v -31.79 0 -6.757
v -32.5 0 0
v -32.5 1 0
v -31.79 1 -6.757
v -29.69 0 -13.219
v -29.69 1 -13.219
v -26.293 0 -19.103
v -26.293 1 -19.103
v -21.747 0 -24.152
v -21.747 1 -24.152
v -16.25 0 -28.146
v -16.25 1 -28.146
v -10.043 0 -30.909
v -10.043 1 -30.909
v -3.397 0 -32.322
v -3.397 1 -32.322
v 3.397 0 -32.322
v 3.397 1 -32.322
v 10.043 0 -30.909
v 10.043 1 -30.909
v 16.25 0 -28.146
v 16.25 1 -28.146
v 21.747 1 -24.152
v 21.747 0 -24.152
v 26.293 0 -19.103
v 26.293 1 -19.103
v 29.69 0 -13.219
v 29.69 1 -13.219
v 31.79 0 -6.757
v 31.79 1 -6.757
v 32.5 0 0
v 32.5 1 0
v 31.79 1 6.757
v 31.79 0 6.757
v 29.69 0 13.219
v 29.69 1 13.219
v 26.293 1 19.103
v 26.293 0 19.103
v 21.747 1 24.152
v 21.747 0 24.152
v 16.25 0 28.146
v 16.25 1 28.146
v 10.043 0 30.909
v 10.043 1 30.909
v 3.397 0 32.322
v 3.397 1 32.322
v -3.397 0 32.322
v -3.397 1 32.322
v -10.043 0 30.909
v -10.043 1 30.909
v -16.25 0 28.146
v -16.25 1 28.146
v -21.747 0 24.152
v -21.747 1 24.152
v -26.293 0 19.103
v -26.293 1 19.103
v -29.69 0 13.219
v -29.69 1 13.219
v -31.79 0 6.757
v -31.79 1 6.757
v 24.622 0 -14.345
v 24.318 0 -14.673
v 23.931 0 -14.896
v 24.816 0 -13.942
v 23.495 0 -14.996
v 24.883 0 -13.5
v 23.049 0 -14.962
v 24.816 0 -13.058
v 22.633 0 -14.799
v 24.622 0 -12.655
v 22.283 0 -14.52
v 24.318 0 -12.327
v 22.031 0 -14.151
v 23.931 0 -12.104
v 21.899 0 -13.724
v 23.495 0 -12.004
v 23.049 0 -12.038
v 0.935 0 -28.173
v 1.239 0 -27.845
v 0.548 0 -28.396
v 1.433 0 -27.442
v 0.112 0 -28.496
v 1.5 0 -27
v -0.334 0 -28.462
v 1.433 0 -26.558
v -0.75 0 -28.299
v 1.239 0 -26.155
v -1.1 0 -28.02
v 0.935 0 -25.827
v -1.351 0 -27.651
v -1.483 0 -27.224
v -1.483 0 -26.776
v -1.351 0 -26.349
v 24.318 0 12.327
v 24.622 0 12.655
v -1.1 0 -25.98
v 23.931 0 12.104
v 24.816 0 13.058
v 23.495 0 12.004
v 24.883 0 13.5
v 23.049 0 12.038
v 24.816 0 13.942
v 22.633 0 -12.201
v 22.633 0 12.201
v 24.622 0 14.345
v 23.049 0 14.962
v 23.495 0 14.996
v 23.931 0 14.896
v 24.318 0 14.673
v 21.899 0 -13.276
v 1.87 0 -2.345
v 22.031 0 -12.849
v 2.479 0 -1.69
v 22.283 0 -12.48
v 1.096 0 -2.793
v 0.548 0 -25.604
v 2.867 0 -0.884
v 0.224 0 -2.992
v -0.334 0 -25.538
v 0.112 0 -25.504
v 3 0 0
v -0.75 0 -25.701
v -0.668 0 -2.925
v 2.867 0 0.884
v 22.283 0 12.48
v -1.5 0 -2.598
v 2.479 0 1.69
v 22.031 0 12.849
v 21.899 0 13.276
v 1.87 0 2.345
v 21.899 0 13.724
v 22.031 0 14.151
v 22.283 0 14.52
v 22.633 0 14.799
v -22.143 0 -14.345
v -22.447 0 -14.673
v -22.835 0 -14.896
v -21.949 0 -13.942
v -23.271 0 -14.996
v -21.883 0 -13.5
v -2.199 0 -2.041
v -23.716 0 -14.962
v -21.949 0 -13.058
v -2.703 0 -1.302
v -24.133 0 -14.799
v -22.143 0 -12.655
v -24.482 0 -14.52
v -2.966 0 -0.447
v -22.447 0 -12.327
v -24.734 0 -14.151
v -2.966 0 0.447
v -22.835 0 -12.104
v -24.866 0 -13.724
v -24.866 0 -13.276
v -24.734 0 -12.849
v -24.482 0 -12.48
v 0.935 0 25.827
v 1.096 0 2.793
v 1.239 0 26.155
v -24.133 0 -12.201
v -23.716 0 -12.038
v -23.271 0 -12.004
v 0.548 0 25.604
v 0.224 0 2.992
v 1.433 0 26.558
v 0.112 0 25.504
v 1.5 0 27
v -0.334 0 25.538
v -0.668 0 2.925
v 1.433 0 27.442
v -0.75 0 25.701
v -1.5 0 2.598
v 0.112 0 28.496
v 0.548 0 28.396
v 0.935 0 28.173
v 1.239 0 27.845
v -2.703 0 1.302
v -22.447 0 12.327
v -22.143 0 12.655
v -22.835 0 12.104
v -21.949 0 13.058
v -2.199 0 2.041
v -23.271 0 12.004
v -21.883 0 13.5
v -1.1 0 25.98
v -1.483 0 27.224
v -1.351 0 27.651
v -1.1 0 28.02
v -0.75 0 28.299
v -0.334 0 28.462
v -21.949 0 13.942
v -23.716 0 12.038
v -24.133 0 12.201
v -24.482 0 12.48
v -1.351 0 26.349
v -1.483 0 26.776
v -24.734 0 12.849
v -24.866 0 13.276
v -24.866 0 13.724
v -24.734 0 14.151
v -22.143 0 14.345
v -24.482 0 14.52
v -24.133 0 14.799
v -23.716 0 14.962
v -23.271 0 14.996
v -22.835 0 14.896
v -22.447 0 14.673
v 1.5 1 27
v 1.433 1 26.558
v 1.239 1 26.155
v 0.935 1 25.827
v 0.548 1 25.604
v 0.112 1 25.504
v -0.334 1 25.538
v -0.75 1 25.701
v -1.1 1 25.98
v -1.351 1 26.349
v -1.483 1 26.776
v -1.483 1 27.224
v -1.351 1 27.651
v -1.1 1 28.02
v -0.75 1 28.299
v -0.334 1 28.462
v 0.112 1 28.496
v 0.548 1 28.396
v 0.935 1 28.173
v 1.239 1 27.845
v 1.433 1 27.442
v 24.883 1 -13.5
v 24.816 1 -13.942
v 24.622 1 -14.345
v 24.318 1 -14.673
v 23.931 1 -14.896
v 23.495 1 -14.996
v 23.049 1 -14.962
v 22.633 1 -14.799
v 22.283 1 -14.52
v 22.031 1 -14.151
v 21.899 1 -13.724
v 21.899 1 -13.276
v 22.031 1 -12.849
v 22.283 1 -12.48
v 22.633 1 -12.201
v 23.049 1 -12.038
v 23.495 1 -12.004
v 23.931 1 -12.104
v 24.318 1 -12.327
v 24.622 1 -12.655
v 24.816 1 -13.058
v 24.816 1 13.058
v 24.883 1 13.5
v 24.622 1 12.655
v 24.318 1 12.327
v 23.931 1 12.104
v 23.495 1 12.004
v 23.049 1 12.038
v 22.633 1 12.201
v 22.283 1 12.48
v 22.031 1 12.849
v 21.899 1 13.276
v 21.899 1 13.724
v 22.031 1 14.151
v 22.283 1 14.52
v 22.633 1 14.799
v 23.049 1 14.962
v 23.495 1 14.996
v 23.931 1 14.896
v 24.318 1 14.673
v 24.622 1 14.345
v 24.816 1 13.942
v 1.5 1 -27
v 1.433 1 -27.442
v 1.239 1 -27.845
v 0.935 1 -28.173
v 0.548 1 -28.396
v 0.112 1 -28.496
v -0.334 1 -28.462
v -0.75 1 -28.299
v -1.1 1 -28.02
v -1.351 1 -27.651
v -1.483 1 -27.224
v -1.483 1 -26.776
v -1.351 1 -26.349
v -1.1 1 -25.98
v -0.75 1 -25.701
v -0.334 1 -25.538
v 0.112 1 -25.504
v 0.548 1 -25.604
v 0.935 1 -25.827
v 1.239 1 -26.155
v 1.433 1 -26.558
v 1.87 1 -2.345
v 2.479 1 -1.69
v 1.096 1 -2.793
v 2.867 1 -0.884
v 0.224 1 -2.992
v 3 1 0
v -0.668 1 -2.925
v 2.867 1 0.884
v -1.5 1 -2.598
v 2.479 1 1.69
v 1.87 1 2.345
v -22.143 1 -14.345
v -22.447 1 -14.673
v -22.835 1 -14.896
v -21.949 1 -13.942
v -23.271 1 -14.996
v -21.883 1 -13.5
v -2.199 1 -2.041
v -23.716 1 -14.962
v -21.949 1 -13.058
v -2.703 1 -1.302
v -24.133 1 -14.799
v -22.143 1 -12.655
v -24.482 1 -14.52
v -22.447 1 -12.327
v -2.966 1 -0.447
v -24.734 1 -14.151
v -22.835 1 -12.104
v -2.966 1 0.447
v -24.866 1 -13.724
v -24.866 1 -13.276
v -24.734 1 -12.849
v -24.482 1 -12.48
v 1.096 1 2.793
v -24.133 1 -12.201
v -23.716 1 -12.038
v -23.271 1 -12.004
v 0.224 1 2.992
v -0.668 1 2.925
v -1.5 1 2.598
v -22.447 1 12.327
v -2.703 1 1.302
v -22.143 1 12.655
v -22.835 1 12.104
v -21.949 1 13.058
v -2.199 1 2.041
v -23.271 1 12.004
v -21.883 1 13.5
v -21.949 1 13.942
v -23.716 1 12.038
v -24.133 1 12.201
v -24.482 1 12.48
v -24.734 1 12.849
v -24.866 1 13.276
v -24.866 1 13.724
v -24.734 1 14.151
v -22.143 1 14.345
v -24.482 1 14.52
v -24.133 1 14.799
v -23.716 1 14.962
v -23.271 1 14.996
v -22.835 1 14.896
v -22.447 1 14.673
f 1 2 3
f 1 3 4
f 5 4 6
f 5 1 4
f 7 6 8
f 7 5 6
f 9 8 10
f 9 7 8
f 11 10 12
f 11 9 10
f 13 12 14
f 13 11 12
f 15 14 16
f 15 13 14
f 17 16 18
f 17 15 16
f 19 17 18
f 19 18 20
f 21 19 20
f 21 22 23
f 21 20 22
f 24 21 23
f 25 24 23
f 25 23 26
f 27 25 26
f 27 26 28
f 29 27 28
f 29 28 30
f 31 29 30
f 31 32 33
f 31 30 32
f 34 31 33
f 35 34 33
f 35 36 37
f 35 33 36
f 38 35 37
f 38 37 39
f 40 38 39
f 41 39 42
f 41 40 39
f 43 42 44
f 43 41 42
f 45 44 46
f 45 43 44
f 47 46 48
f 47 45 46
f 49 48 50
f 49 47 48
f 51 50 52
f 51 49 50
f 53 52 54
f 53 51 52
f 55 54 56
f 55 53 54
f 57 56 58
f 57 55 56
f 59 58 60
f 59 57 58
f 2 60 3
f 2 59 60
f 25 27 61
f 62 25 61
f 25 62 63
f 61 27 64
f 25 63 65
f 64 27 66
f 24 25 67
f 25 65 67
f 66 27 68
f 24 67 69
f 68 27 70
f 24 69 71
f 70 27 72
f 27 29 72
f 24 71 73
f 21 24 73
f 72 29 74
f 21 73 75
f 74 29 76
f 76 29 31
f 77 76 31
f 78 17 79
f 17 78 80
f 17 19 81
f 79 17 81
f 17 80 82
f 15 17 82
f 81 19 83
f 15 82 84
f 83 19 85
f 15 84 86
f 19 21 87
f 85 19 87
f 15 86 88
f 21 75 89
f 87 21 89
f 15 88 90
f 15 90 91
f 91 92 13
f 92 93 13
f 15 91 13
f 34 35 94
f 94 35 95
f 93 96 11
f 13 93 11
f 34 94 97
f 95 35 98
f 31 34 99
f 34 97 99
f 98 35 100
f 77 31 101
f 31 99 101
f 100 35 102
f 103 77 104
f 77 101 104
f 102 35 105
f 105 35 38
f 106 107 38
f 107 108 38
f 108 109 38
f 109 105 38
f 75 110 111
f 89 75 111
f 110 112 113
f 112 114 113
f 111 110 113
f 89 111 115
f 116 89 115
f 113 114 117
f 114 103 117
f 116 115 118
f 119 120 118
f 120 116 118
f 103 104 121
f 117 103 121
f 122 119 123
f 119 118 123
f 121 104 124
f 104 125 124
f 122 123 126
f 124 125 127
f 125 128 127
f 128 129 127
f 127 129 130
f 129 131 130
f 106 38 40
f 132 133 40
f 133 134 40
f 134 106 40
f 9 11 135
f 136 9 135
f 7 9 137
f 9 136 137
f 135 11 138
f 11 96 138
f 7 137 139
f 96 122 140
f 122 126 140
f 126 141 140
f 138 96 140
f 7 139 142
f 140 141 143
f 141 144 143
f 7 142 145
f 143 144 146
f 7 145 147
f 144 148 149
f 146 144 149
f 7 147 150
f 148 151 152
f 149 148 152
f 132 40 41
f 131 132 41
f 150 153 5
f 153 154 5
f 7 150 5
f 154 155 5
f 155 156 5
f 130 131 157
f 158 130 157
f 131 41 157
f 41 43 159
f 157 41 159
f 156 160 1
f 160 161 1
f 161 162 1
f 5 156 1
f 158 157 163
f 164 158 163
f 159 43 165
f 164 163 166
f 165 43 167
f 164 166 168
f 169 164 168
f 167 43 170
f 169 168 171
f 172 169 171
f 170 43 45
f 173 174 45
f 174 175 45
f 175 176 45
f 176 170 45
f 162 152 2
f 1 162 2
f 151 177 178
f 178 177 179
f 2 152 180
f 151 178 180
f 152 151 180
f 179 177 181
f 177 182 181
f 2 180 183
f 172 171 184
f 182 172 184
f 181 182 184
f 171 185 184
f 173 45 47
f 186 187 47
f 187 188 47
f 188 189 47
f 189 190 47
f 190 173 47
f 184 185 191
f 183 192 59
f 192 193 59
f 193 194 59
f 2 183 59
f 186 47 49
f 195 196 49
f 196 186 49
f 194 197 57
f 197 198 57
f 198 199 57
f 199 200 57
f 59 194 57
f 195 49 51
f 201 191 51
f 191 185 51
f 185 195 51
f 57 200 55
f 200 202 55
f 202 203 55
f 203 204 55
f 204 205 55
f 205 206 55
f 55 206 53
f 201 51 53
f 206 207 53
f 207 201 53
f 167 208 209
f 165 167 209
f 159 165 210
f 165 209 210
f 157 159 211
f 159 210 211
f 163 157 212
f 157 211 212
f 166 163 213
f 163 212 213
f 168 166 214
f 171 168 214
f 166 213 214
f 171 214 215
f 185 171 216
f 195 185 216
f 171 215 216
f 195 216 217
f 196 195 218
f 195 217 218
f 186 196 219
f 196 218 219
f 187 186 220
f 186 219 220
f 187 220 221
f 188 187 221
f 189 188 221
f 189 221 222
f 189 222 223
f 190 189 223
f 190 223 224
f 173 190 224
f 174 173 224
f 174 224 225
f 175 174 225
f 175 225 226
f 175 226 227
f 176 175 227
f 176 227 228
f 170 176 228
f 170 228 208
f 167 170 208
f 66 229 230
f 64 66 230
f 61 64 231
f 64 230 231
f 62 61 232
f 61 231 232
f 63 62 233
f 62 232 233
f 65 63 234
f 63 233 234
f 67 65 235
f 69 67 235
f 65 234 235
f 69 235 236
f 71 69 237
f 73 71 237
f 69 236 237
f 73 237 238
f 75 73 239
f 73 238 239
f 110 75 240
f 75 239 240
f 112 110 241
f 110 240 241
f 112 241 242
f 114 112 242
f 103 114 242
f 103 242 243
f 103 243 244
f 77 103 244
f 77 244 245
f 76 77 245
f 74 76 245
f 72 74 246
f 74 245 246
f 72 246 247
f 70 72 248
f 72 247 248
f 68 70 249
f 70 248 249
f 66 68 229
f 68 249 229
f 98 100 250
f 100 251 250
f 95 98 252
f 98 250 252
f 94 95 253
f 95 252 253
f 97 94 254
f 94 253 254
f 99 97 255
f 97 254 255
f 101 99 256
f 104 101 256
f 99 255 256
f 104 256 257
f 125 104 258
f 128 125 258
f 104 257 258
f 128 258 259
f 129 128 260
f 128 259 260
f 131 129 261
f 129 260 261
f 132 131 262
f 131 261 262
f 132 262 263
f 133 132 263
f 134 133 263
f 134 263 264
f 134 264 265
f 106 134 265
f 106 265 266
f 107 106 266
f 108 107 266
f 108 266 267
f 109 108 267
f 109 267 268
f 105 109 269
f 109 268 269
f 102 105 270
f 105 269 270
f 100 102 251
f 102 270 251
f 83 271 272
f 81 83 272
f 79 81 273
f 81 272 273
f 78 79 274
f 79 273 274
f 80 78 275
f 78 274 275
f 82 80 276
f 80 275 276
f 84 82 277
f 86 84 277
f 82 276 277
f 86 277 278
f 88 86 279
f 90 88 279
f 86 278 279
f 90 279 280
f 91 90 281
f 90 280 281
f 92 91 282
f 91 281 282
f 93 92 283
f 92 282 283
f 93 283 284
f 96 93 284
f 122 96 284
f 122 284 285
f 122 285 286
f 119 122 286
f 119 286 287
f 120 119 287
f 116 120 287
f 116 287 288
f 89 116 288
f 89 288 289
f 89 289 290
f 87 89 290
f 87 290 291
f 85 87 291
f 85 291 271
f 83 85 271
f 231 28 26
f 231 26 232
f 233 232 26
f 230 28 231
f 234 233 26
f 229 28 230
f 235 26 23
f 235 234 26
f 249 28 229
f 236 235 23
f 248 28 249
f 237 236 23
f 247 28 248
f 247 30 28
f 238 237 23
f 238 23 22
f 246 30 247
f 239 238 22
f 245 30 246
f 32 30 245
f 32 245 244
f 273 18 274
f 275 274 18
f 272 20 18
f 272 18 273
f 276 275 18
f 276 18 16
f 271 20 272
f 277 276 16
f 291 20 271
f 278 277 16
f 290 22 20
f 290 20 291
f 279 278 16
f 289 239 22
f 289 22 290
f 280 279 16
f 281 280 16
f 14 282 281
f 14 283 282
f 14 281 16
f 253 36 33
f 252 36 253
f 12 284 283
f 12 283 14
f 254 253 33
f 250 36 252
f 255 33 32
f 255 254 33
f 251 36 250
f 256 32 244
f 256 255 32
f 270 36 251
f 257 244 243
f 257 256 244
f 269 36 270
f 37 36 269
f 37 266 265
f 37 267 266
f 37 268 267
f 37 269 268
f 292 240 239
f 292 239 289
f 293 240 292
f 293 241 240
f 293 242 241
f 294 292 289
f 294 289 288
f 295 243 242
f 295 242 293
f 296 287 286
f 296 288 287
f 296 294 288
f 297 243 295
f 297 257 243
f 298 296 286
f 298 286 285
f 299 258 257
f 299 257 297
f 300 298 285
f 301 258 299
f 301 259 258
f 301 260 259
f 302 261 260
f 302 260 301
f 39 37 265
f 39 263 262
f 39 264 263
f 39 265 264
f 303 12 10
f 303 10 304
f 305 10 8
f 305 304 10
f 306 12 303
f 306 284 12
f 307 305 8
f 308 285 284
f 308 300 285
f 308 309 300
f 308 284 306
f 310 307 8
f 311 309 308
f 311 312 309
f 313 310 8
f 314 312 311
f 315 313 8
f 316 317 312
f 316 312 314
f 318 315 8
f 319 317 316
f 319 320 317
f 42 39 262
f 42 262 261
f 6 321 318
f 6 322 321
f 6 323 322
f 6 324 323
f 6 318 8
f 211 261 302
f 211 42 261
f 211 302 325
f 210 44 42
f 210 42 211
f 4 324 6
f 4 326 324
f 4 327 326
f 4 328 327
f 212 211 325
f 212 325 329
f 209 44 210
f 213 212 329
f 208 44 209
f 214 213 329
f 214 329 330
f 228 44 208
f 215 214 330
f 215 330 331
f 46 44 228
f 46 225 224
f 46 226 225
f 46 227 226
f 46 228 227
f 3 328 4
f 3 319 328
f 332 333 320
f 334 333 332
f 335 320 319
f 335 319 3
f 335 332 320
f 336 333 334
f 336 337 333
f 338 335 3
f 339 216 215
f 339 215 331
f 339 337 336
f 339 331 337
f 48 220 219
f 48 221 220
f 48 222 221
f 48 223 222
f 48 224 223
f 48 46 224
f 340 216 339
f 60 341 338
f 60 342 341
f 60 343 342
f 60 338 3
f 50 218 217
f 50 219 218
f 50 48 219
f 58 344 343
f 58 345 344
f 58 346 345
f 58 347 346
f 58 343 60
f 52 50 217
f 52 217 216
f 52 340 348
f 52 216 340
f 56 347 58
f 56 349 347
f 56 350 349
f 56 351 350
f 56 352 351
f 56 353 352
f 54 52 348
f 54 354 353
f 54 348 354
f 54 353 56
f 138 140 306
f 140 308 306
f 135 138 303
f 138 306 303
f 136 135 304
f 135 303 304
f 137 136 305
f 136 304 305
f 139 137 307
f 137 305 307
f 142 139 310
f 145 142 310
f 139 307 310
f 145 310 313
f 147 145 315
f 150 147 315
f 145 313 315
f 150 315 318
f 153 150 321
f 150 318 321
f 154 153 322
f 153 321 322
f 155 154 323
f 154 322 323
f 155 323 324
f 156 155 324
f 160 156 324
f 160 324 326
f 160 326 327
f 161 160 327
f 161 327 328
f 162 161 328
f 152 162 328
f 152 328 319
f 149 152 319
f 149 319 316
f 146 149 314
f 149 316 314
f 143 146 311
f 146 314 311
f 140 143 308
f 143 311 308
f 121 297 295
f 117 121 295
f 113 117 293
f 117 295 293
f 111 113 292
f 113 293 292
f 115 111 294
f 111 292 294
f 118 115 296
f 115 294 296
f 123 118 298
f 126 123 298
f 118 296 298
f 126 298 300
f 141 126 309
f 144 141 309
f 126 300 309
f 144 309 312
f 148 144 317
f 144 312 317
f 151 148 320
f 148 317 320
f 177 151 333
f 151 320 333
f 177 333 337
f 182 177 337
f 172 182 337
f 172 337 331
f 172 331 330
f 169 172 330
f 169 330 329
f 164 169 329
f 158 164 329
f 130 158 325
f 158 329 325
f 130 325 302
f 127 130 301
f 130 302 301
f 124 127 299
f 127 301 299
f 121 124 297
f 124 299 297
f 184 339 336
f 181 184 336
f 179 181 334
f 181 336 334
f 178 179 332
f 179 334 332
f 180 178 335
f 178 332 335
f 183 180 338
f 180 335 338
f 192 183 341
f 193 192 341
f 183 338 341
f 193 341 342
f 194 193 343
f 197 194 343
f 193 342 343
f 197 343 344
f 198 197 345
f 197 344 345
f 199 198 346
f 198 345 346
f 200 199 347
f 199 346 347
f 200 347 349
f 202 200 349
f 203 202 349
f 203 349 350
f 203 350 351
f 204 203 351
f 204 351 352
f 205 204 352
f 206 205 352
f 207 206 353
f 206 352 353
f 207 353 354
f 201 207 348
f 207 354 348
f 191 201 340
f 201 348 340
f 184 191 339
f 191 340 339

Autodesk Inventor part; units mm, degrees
ref_plane "YZ Plane" through (0, 0, 0) normal (1, 0, 0) x (0, 1, 0)
ref_plane "XZ Plane" through (0, 0, 0) normal (0, 1, 0) x (-1, 0, 0)
ref_plane "XY Plane" through (0, 0, 0) normal (0, 0, 1) x (1, 0, 0)
sketch "Esquisse1" plane through (0, 0, 0) normal (0, 1, 0) x (-1, 0, 0)
  circle A0 centre (0, 0) radius 32.5
  dimension "d0" = 65
extrude "Extrusion1" add sketch "Esquisse1" along normal blind 1
sketch "Esquisse2" plane through (0, 1, 0) normal (0, 1, 0) x (1, 0, 0)
  circle A0 centre (0, 0) radius 32.5 projected
  circle A1 centre (0, 0) radius 3
  dimension "d3" = 6
extrude "Extrusion2" cut sketch "Esquisse2" against normal through all contours A1
sketch "Esquisse3" plane through (0, 1, 0) normal (0, 1, 0) x (1, 0, 0)
  circle A0 centre (0, 0) radius 3 projected
  circle A1 centre (0, 0) radius 32.5 projected
  line L0 (0, 0) -> (0, 32.5) construction
  circle A2 centre (0, 27) radius 1.5
  circle A3 centre (-23.3827, 13.5) radius 1.5
  circle A4 centre (-23.3827, -13.5) radius 1.5
  circle A5 centre (0, -27) radius 1.5
  circle A6 centre (23.3827, -13.5) radius 1.5
  circle A7 centre (23.3827, 13.5) radius 1.5
  dimension "d6" = 27
  dimension "d7" = 3
  dimension "d10" = 360
extrude "Extrusion3" cut sketch "Esquisse3" against normal through all contours A2 | A3 | A4 | A5 | A6 | A7
properties part number "wheel_adapter"
